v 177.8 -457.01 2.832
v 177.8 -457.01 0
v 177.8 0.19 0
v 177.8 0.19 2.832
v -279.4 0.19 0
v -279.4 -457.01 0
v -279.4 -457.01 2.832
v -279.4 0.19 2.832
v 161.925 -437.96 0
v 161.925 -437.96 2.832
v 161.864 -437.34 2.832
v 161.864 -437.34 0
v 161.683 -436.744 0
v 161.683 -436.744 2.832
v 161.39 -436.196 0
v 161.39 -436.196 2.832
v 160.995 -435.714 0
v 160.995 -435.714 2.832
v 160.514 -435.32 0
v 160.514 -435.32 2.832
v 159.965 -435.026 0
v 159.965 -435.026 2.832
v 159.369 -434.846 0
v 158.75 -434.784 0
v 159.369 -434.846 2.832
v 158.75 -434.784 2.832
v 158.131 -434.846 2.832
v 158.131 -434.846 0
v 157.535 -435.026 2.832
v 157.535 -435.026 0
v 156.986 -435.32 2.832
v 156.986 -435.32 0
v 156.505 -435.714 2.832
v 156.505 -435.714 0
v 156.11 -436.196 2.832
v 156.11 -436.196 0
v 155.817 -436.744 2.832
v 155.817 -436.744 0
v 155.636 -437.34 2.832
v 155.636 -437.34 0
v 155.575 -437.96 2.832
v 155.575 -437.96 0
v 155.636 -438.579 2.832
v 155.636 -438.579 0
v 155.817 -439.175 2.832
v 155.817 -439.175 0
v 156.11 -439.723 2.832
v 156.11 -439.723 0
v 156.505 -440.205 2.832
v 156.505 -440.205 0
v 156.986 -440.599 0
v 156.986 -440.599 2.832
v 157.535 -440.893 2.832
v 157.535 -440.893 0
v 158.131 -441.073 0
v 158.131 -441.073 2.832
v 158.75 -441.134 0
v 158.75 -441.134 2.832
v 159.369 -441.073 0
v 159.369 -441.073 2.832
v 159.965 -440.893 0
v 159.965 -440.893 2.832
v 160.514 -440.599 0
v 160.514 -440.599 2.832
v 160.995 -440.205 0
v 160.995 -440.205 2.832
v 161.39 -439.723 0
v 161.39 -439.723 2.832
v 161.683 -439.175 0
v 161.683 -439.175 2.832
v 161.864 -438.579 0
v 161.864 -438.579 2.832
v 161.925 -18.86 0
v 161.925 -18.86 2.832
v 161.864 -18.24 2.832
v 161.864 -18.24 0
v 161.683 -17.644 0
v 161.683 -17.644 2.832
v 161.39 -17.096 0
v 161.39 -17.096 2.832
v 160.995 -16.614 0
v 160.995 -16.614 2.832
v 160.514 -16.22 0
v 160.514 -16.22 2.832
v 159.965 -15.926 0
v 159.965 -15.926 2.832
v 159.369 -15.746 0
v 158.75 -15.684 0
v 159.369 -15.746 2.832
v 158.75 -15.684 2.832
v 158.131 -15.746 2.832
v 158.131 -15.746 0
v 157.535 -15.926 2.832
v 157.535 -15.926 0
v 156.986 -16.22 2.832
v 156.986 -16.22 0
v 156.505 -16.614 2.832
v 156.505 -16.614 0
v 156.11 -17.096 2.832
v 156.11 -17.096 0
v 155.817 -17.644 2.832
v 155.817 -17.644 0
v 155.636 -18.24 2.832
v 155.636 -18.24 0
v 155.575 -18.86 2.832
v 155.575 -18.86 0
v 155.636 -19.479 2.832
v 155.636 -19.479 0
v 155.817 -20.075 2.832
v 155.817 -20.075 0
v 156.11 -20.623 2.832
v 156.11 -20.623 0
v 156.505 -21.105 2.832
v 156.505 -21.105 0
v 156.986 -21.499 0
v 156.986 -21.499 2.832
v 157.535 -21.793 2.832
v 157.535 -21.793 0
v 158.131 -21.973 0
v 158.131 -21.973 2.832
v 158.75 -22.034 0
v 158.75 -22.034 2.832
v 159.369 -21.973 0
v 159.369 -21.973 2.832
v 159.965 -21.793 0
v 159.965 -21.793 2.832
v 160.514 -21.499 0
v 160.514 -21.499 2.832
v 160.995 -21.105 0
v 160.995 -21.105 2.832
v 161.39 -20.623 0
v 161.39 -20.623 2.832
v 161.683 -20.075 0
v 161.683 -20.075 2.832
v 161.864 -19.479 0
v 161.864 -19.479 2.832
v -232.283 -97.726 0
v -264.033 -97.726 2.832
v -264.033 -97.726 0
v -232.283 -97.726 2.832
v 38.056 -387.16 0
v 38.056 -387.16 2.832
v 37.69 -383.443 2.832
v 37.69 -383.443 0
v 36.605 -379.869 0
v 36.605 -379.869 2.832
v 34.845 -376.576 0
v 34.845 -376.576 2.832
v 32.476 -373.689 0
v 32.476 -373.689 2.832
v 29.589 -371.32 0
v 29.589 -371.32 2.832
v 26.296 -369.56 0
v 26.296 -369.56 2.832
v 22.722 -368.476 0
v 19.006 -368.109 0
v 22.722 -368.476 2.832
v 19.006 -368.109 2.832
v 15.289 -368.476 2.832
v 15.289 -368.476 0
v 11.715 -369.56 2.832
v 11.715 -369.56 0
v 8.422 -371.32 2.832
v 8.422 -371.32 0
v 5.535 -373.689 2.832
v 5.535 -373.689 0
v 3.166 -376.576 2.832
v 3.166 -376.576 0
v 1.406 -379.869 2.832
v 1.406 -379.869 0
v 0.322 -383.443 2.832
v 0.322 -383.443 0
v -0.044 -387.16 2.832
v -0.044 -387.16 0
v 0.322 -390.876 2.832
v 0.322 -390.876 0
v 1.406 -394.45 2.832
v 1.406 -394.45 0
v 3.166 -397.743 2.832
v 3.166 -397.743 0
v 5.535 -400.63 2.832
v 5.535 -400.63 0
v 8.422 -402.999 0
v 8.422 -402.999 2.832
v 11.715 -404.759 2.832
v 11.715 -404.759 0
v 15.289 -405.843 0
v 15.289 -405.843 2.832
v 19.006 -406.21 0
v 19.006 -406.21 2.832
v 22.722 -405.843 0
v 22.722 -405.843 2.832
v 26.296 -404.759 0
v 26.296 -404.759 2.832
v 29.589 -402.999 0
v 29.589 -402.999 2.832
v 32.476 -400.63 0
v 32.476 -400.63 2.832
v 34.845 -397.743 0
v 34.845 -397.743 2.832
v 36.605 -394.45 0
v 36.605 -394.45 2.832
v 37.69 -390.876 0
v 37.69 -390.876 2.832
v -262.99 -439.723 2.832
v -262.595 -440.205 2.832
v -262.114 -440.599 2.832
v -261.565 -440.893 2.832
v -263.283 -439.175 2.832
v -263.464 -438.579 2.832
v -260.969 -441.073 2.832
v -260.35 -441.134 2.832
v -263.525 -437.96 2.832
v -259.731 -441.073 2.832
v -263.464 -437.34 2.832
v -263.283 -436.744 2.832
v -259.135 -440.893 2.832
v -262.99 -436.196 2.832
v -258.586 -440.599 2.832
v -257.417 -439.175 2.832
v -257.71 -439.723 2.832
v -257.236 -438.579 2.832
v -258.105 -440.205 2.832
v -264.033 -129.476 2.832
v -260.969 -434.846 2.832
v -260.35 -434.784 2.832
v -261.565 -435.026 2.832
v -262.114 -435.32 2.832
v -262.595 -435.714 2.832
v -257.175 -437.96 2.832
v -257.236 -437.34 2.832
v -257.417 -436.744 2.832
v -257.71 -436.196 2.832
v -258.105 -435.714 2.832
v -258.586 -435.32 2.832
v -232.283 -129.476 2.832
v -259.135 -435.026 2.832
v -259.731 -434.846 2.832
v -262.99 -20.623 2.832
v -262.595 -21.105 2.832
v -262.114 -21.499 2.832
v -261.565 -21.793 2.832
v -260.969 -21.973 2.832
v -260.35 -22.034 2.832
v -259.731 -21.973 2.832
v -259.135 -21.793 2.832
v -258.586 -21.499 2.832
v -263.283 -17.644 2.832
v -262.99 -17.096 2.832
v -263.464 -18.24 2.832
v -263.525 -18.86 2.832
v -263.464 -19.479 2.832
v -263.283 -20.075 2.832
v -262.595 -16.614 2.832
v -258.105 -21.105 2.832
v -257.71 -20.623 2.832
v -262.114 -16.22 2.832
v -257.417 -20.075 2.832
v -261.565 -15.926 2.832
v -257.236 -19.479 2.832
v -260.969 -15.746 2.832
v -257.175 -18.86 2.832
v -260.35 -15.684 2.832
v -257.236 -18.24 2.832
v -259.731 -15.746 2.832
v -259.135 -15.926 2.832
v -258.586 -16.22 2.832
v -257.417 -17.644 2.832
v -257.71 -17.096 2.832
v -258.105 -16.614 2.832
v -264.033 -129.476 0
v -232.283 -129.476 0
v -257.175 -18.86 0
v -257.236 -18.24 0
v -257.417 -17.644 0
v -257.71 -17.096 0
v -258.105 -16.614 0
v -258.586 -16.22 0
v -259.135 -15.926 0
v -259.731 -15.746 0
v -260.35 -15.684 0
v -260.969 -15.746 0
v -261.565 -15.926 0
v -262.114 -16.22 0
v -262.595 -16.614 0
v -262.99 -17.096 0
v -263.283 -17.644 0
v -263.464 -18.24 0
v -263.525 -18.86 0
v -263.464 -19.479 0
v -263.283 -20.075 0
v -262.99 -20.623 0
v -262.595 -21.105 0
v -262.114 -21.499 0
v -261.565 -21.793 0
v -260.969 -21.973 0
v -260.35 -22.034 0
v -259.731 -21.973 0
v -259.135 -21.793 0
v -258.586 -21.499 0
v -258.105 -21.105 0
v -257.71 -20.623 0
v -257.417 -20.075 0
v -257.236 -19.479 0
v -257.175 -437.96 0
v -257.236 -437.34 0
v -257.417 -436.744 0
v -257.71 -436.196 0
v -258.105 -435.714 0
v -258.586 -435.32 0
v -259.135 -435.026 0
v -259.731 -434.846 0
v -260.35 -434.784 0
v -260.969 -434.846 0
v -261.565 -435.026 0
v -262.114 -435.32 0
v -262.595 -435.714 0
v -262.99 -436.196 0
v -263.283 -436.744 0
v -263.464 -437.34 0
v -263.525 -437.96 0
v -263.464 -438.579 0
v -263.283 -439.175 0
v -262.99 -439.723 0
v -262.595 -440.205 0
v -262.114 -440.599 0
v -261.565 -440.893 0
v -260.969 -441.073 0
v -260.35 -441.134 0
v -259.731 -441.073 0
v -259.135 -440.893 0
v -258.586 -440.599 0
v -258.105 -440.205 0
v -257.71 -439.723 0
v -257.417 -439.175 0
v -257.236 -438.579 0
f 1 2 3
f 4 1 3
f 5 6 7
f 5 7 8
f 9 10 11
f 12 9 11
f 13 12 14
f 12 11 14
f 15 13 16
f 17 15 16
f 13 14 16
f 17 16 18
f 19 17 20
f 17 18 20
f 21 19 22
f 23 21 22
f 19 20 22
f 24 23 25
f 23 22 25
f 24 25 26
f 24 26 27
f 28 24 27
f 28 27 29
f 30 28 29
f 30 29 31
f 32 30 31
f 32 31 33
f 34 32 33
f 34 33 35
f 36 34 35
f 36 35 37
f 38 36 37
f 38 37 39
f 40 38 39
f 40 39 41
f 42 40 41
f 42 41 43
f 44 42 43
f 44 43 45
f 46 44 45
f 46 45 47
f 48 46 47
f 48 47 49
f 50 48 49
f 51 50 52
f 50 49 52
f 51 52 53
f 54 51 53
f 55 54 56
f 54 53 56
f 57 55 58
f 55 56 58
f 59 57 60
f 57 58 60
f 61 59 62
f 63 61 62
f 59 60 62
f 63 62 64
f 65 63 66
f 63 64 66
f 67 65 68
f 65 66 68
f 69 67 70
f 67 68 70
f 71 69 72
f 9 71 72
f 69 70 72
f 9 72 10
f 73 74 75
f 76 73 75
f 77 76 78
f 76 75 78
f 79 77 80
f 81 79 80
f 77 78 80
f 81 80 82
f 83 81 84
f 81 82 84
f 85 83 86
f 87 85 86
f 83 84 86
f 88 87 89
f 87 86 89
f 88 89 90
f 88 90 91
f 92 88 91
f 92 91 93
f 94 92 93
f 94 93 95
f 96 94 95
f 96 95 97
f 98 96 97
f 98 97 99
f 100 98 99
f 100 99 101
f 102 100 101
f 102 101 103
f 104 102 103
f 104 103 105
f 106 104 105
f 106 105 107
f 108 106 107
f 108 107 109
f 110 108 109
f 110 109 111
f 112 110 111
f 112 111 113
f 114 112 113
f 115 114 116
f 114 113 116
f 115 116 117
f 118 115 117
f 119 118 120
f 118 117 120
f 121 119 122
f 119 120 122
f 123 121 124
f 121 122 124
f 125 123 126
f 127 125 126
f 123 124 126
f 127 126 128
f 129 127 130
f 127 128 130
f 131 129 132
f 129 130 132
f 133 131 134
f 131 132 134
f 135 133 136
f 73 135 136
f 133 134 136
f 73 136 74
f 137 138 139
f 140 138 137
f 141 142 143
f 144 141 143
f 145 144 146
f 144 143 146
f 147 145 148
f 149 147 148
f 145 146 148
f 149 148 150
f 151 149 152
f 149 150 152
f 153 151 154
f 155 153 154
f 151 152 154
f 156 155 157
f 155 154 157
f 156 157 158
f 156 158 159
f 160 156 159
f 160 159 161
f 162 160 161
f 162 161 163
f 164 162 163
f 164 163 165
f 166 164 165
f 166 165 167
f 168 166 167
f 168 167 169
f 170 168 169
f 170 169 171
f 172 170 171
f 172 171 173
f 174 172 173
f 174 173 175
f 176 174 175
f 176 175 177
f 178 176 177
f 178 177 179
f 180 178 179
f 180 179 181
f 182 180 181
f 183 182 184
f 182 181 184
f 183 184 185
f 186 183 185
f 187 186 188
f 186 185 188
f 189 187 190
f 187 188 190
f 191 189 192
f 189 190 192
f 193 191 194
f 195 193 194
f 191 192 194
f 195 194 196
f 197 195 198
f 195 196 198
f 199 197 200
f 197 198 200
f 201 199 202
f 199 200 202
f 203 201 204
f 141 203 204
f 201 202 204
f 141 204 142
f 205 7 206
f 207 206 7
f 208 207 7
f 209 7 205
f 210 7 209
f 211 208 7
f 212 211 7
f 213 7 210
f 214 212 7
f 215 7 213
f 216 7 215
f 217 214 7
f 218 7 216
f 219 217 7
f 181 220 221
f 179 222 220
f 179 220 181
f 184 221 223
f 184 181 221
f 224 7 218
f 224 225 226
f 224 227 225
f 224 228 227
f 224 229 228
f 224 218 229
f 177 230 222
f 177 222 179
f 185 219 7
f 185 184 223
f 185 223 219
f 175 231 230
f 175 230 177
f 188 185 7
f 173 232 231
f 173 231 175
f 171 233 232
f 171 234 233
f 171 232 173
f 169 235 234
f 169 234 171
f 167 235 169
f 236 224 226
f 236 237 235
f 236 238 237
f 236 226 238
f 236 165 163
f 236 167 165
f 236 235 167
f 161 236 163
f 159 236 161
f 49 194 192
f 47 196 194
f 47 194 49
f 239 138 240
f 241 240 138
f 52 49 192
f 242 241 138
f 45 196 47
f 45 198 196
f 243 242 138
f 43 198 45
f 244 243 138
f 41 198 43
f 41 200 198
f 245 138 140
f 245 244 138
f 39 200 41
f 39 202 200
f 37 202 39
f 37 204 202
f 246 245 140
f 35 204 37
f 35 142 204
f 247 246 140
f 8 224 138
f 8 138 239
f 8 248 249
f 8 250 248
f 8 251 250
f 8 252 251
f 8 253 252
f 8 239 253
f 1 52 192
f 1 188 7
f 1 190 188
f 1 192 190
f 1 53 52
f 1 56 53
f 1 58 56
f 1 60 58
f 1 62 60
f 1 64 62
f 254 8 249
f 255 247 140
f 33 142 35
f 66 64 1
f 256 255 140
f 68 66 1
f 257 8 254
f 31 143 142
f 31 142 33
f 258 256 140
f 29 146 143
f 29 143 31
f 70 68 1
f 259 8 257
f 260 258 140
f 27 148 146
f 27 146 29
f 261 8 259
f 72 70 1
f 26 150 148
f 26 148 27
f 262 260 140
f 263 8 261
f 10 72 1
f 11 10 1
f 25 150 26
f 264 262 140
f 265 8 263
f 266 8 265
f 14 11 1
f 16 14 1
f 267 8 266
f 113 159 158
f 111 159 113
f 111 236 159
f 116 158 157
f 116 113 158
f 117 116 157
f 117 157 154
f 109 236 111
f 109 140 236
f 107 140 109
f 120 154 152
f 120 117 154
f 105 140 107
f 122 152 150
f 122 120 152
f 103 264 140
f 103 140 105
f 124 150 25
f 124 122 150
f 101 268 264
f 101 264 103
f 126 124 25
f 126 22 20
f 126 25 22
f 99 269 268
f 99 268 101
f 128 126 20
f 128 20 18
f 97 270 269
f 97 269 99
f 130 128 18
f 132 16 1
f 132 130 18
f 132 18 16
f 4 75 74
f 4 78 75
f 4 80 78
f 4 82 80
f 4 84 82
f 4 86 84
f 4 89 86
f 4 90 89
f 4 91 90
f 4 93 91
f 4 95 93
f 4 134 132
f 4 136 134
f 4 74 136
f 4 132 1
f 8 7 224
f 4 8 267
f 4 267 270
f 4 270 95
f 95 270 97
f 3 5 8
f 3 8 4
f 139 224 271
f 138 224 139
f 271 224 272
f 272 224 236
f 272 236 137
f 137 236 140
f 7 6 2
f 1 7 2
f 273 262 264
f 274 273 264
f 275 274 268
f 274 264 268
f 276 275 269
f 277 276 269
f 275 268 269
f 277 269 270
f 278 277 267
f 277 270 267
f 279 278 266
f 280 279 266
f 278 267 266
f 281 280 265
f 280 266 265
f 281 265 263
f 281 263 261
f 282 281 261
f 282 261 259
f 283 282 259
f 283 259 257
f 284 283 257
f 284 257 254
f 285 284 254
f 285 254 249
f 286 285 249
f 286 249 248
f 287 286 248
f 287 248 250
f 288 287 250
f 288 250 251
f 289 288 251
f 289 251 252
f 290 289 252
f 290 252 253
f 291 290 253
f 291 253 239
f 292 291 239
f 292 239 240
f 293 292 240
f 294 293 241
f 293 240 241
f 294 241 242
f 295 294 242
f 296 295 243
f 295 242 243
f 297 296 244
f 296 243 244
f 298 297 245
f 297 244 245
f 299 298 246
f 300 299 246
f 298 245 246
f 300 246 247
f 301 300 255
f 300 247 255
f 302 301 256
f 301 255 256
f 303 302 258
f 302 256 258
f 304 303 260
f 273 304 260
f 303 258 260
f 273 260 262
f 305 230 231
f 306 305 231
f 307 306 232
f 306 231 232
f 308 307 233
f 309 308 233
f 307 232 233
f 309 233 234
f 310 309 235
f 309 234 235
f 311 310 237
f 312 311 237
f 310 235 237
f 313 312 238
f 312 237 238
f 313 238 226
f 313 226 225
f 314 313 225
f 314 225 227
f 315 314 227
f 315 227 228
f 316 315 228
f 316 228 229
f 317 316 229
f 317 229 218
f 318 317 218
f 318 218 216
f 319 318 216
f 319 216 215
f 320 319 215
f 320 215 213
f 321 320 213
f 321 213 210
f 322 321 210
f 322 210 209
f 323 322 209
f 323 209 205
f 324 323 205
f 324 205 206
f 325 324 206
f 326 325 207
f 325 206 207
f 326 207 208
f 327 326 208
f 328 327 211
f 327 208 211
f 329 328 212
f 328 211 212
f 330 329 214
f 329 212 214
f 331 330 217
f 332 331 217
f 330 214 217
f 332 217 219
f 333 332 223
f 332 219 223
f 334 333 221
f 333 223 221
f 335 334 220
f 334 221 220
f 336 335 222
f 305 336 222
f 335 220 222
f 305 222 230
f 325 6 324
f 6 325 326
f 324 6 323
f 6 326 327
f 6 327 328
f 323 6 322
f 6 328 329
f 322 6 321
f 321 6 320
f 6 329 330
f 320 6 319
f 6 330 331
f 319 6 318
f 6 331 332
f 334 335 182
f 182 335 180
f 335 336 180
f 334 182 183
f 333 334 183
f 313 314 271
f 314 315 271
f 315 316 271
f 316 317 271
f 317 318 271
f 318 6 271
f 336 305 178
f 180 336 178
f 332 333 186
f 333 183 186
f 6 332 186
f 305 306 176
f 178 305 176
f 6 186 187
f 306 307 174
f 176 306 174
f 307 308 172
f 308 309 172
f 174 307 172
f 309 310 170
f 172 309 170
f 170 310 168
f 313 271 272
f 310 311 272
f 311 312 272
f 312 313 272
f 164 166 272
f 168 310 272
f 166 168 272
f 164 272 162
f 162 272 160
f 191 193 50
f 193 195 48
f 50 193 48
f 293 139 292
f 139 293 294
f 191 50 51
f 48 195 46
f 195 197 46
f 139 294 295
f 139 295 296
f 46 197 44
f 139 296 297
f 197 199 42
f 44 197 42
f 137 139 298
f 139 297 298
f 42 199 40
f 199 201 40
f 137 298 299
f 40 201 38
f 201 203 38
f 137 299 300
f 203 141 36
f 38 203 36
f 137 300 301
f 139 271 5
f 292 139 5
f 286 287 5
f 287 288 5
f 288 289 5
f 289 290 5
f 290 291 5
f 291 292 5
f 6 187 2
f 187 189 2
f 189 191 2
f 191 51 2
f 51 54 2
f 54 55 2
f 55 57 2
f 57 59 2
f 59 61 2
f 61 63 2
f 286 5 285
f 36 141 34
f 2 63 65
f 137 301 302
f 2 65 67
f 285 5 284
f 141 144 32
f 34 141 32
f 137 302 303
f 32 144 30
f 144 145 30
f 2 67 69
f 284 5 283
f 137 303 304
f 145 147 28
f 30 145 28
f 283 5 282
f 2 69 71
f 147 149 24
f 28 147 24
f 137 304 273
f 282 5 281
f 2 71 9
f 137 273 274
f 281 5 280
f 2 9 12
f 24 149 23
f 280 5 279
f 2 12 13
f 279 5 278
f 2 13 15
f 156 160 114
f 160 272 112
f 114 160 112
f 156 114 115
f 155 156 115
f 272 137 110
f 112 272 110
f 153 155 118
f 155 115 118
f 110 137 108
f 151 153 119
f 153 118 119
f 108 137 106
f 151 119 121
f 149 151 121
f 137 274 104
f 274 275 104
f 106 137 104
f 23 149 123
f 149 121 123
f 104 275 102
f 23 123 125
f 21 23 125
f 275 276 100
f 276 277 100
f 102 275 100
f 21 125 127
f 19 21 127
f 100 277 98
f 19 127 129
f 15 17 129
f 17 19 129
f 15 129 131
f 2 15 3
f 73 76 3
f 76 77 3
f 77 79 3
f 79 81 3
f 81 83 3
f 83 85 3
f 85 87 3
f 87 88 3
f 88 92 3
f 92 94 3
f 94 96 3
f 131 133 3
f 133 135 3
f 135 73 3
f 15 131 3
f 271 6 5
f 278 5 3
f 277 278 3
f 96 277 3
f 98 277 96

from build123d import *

# Parameters (mm, degrees)
SKETCH1_W           = 457.2
SKETCH1_H           = 457.2
BOSS_EXTRUDE1_DEPTH = 2.8321
SKETCH2_R           = 3.175
SKETCH2_R_2         = 19.05
SKETCH2_W           = 31.75
SKETCH2_H           = 31.75
CUT_EXTRUDE1_DEPTH  = 536.658532911


with BuildPart() as part:
    # Sketch1 → Boss-Extrude1 (new body)
    with BuildSketch(Plane.XY):
        with Locations((-50.8, -228.4095)):
            Rectangle(SKETCH1_W, SKETCH1_H)
    extrude(amount=BOSS_EXTRUDE1_DEPTH)

    # Sketch2 → Cut-Extrude1 (cut, through all)
    with BuildSketch(Plane.XY.offset(2.8321)):
        with Locations((-260.35, -18.8595)):
            Circle(SKETCH2_R)
        with Locations((-260.35, -437.9595)):
            Circle(SKETCH2_R)
        with Locations((158.75, -437.9595)):
            Circle(SKETCH2_R)
        with Locations((158.75, -18.8595)):
            Circle(SKETCH2_R)
        with Locations((19.00555, -387.1595)):
            Circle(SKETCH2_R_2)
        with Locations((-248.158, -113.6015)):
            Rectangle(SKETCH2_W, SKETCH2_H)
    extrude(amount=-CUT_EXTRUDE1_DEPTH, mode=Mode.SUBTRACT)


solid = part.part
